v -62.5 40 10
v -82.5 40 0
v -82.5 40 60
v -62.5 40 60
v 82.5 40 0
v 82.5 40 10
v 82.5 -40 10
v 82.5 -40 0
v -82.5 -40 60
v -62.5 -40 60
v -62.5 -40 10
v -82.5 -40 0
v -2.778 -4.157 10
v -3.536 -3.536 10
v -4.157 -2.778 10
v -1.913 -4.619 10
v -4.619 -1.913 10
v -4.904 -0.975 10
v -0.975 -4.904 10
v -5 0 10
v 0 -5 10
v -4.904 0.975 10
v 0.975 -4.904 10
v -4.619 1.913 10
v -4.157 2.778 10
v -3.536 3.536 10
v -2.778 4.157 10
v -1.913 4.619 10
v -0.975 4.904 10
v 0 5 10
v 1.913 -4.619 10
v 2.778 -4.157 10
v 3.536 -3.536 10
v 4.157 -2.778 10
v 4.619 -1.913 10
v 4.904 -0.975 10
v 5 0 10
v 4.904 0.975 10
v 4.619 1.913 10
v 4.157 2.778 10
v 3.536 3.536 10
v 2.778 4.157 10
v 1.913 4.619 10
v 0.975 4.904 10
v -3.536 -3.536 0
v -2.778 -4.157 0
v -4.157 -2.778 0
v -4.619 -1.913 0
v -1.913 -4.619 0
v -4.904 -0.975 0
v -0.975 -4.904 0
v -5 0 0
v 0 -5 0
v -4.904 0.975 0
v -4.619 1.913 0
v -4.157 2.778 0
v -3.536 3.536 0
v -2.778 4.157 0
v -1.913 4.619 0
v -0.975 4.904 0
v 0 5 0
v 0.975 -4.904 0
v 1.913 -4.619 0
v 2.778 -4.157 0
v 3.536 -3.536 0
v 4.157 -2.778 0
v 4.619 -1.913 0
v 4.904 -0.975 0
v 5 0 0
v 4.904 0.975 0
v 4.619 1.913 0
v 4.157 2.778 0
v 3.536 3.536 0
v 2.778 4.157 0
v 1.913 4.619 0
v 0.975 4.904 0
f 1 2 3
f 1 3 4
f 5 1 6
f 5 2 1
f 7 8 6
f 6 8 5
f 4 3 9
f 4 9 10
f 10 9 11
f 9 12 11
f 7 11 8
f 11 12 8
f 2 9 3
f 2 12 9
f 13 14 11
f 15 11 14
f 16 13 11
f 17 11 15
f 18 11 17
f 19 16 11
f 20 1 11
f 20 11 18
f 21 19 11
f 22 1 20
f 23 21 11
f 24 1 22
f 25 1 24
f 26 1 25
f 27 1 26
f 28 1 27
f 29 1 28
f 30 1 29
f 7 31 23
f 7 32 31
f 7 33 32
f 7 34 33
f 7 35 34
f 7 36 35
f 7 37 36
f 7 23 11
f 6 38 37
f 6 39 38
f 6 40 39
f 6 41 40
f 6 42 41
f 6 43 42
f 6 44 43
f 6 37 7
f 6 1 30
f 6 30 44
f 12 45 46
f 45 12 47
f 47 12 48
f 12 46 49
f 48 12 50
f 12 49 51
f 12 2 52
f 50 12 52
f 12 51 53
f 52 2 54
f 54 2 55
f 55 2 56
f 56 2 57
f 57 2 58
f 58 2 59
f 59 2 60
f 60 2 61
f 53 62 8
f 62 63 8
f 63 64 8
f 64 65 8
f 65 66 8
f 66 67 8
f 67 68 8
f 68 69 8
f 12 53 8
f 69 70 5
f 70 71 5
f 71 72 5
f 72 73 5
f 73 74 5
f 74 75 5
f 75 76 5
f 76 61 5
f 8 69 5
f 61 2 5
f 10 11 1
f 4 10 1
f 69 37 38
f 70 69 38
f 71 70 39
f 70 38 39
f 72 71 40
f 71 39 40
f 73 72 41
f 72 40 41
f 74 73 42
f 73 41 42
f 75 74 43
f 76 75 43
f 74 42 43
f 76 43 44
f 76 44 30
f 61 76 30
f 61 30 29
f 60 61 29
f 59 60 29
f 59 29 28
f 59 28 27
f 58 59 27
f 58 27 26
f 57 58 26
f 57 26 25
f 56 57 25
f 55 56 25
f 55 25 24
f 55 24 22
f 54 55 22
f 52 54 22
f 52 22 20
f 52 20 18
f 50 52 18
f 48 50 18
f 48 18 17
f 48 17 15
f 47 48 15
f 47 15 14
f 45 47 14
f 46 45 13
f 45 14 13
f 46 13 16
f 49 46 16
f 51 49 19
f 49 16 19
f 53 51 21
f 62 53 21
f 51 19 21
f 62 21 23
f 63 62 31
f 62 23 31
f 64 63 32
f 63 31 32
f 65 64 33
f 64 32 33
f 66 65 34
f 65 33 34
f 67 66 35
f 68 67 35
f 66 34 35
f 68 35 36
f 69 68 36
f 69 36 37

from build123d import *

# Parameters (mm, degrees)
SKETCH1_W           = 165
SKETCH1_H           = 80
BOSS_EXTRUDE1_DEPTH = 10
SKETCH2_W           = 20
SKETCH2_H           = 80
BOSS_EXTRUDE2_DEPTH = 50
CUT_EXTRUDE1_REACH  = 106.433
SKETCH3_R           = 5


with BuildPart() as part:
    # Sketch1 → Boss-Extrude1 (new body)
    with BuildSketch(Plane.XY):
        Rectangle(SKETCH1_W, SKETCH1_H)
    extrude(amount=BOSS_EXTRUDE1_DEPTH)

    # Sketch2 → Boss-Extrude2 (add)
    with BuildSketch(Plane.XY.offset(10)):
        with Locations((-72.5, 0)):
            Rectangle(SKETCH2_W, SKETCH2_H)
    extrude(amount=BOSS_EXTRUDE2_DEPTH)

    # Sketch3 → Cut-Extrude1 (cut, up to next)
    with BuildSketch(Plane.XY.offset(10), mode=Mode.PRIVATE) as cut_extrude1_sk1:
        Circle(SKETCH3_R)
    cut_extrude1_tool1 = extrude(cut_extrude1_sk1.sketch, amount=-CUT_EXTRUDE1_REACH, mode=Mode.PRIVATE) & part.part
    add(cut_extrude1_tool1.solids().sort_by_distance((0, 0, 10))[0], mode=Mode.SUBTRACT)


solid = part.part
